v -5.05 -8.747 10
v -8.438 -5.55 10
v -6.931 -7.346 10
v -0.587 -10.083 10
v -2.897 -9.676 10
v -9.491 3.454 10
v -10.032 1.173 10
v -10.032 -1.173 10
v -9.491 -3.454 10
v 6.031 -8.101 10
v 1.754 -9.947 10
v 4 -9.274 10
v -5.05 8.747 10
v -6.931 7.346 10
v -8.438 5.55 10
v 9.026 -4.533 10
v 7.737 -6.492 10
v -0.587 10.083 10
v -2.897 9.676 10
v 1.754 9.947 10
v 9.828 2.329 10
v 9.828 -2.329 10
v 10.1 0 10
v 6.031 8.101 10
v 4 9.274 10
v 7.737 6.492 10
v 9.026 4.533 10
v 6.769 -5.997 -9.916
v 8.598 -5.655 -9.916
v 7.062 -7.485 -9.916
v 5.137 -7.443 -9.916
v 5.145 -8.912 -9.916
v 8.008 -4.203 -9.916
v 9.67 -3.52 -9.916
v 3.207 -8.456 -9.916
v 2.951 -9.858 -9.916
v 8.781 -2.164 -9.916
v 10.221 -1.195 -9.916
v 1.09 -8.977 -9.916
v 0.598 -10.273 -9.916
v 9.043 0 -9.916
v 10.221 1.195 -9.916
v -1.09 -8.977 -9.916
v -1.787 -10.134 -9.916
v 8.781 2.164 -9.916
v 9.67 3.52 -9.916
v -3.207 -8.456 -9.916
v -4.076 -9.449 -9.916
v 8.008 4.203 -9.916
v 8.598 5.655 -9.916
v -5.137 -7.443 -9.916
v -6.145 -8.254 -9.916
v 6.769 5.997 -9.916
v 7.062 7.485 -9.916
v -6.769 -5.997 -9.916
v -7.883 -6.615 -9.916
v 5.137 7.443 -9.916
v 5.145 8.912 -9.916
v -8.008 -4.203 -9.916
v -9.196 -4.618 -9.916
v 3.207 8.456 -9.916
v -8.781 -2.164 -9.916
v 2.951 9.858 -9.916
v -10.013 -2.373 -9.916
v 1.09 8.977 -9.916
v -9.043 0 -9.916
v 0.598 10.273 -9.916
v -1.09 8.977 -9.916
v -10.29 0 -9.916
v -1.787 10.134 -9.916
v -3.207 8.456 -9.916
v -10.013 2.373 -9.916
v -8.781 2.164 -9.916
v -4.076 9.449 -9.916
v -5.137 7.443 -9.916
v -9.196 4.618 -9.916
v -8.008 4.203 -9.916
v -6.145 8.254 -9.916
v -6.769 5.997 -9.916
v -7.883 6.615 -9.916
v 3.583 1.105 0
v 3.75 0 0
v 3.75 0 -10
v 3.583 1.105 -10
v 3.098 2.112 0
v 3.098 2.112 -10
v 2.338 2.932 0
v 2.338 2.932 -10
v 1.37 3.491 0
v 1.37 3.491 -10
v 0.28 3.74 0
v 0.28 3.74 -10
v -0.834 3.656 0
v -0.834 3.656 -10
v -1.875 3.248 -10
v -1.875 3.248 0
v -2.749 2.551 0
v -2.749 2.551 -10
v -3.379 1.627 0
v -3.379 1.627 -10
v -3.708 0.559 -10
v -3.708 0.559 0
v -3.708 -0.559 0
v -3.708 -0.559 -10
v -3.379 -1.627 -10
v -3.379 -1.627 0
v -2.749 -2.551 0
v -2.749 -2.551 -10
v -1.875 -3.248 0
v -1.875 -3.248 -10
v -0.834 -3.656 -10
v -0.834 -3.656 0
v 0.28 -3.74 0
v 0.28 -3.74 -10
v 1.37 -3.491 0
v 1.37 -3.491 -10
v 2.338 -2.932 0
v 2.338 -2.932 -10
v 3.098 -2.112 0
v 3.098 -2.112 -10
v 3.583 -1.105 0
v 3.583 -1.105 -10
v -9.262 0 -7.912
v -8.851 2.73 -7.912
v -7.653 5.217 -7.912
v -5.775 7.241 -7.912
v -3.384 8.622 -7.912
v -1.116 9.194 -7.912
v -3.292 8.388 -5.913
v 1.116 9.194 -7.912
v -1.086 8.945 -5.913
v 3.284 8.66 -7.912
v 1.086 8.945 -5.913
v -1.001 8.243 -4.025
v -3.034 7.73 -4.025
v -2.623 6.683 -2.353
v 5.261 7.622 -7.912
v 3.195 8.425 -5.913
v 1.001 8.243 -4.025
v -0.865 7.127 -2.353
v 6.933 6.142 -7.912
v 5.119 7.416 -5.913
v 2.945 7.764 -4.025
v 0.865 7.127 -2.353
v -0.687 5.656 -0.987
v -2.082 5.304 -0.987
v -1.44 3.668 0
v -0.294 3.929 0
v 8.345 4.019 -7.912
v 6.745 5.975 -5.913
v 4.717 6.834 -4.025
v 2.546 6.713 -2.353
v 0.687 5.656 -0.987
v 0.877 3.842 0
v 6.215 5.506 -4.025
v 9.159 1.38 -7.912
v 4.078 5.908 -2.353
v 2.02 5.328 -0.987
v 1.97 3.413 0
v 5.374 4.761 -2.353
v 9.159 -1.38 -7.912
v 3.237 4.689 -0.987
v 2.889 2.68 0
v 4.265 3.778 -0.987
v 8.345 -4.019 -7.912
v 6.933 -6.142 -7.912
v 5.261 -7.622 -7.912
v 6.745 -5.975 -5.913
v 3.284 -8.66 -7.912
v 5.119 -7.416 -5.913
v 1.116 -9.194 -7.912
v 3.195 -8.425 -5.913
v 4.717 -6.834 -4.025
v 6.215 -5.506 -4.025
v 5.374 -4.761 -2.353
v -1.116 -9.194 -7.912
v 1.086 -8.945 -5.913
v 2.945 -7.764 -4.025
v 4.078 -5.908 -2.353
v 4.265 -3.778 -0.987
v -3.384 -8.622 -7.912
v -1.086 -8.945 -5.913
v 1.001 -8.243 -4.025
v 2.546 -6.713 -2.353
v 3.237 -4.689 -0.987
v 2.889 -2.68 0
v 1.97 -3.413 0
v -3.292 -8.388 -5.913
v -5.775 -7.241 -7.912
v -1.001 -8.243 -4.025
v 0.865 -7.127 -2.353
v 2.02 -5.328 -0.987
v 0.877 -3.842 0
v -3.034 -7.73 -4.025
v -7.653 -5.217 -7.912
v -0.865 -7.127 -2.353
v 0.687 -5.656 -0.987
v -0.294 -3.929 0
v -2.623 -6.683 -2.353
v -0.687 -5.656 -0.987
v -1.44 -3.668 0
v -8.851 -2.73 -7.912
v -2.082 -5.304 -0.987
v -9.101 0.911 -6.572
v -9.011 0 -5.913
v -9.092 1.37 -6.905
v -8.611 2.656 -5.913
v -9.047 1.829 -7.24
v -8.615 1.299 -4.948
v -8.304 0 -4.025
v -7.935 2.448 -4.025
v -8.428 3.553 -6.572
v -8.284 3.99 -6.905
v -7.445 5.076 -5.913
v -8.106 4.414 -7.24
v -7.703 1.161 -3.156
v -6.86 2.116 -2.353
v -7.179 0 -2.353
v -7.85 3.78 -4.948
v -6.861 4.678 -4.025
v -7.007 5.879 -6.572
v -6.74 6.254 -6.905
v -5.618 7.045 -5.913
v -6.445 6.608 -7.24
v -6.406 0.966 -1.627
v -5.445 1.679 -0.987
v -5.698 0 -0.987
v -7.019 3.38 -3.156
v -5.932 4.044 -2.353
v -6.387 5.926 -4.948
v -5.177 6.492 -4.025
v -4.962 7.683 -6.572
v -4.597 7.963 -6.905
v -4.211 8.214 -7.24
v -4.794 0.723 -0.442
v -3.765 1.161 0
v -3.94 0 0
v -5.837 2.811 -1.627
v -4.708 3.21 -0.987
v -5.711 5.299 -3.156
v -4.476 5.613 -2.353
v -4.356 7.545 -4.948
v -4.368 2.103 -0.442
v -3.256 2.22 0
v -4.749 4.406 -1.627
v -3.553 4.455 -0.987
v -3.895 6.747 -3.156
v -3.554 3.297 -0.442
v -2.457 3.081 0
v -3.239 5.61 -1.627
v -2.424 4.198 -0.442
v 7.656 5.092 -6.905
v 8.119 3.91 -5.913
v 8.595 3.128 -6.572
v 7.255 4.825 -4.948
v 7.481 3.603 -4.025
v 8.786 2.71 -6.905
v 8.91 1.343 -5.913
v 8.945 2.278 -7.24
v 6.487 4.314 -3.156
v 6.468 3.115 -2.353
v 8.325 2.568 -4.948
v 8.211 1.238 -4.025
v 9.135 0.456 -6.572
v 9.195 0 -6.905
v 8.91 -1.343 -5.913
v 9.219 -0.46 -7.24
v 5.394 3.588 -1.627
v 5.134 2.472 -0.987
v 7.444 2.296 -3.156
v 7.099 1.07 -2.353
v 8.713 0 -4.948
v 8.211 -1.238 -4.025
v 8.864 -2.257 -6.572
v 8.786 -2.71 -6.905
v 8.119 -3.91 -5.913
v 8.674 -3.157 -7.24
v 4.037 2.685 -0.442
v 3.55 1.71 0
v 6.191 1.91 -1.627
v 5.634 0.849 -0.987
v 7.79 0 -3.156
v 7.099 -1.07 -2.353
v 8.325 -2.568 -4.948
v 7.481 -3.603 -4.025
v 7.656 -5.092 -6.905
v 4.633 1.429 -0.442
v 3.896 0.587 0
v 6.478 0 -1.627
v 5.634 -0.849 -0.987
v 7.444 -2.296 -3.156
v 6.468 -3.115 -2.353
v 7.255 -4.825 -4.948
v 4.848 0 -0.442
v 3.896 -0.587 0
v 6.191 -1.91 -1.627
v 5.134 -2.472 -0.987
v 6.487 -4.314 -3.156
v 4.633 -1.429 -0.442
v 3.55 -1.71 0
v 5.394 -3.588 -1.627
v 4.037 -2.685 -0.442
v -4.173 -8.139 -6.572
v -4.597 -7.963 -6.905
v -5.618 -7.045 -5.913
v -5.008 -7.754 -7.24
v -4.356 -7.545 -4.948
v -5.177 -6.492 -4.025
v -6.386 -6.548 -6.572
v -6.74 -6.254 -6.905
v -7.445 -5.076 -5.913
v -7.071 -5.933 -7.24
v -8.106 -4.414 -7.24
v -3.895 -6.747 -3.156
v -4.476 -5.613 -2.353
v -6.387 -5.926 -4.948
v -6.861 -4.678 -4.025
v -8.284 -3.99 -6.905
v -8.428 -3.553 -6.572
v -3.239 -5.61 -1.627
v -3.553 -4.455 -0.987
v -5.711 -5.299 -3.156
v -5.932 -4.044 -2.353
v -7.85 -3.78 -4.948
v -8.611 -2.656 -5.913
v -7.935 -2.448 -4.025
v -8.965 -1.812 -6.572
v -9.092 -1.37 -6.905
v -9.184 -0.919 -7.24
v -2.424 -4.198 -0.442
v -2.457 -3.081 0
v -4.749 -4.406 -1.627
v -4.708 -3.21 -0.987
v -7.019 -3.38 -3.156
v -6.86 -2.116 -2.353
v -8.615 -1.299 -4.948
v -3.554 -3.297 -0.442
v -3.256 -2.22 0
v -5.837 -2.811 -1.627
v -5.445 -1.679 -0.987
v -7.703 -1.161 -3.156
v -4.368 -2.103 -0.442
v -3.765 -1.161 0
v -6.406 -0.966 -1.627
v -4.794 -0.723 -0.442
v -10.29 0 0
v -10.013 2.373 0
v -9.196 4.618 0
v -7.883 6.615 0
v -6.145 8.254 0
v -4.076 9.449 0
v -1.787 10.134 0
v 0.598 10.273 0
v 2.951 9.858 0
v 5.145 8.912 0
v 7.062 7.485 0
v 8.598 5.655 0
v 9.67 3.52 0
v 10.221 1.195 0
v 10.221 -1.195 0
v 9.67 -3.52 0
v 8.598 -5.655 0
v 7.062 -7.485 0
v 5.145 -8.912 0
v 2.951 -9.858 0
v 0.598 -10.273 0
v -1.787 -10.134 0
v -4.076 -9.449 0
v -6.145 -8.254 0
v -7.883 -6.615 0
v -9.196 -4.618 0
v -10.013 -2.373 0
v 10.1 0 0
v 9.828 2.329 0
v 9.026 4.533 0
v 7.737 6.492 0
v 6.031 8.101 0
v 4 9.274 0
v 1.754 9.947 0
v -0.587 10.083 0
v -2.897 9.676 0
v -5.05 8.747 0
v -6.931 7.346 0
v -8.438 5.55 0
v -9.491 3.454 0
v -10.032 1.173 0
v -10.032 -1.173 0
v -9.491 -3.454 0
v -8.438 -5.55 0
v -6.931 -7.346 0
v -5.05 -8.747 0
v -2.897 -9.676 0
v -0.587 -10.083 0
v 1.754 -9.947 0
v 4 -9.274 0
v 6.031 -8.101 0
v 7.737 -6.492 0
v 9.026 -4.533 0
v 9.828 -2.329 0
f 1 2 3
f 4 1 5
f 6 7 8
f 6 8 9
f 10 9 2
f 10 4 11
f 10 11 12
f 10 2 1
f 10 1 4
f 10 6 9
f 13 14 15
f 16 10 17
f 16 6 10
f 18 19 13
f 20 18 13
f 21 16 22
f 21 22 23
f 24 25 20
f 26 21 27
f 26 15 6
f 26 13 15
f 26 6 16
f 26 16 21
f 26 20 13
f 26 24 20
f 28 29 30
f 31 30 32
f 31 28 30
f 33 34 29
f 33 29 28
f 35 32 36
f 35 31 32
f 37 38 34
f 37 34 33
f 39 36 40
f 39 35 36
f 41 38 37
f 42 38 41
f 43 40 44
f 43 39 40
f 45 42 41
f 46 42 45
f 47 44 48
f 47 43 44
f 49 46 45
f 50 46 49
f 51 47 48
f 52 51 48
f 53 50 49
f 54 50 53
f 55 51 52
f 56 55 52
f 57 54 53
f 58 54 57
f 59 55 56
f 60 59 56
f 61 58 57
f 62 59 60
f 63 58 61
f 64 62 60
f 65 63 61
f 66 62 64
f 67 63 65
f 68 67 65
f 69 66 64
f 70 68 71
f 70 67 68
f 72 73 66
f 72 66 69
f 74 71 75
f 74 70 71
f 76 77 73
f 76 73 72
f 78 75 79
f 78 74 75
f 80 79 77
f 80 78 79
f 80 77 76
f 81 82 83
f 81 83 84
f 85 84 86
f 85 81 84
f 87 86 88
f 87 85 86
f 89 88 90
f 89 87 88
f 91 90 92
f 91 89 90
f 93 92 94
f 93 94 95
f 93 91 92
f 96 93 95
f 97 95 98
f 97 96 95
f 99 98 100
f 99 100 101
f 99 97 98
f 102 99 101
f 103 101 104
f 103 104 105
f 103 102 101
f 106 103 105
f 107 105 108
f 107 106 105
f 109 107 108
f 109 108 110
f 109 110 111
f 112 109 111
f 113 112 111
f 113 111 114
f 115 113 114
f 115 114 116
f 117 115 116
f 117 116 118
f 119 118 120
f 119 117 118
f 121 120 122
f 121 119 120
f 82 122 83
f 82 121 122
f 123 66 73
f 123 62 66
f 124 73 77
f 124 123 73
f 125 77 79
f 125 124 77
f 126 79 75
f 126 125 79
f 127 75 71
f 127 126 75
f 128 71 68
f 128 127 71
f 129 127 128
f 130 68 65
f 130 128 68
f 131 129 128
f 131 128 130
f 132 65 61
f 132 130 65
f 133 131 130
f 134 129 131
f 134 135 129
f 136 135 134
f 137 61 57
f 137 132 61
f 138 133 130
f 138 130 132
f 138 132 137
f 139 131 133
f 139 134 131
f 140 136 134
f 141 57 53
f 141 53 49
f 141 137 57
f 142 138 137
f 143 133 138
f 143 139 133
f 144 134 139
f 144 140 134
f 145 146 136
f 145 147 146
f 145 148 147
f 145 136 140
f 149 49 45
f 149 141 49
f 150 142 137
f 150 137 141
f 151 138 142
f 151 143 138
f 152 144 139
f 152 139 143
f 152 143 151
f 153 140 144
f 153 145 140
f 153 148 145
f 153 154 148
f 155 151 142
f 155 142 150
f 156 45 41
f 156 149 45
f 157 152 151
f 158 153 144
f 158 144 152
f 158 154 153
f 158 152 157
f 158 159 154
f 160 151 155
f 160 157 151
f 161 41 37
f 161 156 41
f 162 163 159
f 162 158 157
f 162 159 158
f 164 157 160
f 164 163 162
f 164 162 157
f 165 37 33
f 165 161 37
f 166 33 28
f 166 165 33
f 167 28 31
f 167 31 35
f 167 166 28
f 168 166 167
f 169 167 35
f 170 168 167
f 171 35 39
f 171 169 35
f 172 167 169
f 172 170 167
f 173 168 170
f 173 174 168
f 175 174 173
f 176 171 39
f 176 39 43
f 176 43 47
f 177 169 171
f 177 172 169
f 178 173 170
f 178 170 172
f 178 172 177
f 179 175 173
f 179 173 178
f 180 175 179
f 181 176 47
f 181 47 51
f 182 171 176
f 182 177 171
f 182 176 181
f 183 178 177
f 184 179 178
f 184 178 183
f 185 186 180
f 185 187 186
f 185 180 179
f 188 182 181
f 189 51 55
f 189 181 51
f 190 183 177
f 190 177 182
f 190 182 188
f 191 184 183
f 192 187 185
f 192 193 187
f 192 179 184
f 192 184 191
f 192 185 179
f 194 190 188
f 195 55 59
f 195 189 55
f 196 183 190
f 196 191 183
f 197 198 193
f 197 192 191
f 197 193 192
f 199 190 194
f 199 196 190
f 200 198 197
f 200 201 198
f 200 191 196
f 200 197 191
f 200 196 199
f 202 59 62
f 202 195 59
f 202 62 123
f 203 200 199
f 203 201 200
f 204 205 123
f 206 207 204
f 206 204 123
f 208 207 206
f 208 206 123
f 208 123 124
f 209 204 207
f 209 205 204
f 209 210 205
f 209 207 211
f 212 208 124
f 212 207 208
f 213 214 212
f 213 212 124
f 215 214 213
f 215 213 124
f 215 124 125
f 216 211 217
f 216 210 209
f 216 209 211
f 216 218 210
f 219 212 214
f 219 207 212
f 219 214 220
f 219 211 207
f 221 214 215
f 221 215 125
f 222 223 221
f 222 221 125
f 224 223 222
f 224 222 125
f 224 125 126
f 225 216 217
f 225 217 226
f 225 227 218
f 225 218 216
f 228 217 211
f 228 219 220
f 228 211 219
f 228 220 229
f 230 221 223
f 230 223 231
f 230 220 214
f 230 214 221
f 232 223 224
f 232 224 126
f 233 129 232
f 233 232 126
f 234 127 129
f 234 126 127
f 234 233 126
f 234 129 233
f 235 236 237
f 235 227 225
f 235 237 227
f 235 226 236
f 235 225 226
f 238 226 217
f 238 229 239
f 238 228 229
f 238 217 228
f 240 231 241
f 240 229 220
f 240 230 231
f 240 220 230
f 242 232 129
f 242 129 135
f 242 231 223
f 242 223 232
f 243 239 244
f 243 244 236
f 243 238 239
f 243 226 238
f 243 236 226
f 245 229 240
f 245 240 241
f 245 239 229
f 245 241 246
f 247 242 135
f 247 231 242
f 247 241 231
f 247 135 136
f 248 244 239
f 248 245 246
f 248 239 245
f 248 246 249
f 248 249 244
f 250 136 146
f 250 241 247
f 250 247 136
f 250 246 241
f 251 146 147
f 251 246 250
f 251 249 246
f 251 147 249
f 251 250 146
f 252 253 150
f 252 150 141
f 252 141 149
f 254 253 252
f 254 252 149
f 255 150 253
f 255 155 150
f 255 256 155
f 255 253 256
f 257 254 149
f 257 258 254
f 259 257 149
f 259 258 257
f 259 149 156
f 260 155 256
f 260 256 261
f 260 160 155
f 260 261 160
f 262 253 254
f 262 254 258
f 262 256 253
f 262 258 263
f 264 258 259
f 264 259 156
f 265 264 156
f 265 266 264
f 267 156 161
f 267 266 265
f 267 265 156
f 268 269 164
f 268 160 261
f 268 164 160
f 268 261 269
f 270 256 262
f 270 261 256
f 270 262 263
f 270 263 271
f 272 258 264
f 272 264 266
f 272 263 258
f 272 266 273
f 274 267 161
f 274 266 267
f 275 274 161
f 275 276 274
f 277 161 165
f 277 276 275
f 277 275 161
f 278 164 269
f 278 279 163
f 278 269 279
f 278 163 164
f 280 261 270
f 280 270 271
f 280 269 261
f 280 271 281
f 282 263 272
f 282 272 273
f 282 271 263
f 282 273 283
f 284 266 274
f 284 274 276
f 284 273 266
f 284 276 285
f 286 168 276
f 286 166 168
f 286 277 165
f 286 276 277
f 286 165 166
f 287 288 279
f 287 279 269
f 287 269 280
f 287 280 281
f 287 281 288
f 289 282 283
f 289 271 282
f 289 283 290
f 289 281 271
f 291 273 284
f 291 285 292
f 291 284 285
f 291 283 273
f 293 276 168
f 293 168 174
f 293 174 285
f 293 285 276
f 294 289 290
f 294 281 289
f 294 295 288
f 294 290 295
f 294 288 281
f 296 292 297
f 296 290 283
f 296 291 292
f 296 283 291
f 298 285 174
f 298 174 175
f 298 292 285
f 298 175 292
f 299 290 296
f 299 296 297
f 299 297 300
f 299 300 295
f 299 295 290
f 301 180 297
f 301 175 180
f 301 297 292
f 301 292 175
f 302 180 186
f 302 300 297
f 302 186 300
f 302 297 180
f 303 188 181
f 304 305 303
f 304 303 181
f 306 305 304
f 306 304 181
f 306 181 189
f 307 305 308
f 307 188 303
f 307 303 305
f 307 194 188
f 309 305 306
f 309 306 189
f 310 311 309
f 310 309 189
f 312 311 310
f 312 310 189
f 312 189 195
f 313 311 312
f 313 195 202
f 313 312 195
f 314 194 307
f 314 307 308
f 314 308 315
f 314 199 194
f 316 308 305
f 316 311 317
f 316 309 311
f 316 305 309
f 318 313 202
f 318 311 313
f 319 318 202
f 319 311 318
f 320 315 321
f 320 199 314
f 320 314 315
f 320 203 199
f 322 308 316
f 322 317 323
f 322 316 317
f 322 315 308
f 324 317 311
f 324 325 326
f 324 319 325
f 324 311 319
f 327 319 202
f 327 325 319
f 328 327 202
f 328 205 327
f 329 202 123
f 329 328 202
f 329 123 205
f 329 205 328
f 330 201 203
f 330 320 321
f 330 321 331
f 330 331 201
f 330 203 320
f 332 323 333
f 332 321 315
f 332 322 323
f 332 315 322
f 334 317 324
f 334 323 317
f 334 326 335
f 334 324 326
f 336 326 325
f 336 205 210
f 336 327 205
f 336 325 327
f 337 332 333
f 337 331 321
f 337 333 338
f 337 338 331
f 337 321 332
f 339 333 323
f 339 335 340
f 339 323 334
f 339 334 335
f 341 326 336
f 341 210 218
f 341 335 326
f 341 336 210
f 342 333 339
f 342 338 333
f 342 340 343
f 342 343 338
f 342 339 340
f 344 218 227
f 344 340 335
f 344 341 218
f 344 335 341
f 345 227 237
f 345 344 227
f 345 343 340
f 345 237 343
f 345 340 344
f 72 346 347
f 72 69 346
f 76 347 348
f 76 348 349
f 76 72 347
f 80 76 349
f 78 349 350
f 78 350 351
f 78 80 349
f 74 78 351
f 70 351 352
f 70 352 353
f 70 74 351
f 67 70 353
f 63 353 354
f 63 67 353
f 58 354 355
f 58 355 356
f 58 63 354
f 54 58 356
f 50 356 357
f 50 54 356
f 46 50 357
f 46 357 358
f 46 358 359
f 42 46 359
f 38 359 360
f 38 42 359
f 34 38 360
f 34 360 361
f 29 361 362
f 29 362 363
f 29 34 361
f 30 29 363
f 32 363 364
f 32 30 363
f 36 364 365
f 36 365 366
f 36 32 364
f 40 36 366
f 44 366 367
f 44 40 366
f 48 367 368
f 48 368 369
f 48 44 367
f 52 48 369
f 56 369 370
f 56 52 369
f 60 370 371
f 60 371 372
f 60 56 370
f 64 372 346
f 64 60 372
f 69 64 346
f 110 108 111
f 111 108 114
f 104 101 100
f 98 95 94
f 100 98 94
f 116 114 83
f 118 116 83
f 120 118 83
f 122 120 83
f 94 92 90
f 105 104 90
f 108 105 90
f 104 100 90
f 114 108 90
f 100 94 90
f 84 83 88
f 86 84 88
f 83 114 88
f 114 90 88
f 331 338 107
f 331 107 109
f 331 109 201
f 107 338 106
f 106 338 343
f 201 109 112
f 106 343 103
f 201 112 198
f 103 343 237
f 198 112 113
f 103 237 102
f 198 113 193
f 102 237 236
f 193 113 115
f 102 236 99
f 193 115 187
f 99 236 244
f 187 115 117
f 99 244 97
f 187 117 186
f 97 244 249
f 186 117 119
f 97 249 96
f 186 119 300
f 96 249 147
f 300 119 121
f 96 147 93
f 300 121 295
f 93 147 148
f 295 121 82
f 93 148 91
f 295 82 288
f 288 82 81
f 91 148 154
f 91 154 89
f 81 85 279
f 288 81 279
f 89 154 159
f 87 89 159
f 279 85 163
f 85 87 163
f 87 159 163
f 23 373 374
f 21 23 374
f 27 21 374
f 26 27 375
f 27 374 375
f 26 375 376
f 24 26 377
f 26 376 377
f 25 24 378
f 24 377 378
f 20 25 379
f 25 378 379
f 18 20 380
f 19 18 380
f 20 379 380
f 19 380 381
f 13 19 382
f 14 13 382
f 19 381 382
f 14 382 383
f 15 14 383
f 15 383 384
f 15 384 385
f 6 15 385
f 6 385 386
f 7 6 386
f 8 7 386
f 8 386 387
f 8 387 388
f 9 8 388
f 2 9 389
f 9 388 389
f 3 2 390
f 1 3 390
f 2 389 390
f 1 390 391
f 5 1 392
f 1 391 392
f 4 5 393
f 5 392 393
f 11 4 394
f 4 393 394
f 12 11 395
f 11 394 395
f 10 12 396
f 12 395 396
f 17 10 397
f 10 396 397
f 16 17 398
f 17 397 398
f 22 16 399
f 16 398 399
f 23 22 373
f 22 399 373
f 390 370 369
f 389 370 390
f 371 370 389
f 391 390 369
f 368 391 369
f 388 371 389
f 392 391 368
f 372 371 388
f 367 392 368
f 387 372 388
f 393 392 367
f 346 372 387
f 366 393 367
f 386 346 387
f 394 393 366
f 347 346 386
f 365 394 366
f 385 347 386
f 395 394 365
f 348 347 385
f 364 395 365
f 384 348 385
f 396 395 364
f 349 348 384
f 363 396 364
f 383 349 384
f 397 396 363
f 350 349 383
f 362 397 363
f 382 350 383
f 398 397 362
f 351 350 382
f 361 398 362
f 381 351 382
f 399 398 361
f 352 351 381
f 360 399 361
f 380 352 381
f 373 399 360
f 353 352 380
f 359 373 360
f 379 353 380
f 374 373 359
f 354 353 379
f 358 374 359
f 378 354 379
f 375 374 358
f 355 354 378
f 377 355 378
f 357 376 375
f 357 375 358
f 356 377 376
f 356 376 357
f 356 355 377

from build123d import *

# Parameters (mm, degrees)
F0_R     = 10.1
F1_DEPTH = 10
F2_R     = 3.75
F3_DEPTH = 10


with BuildPart() as f1:
    # F0 (on Top) → F1 (new body)
    with BuildSketch(Plane.XY):
        Circle(F0_R)
    extrude(amount=F1_DEPTH)

    # F2 (on Top) → F3 (join)
    with BuildSketch(Plane.XY):
        Circle(F2_R)
    extrude(amount=-F3_DEPTH)

    # F4 (on Front) → F5 (revolve)
    with BuildSketch(Plane.XZ):
        with BuildLine():
            Line((-3.9404258132, 0), (-10.2904258132, 0))
            Line((-10.2904258132, 0), (-10.2904258132, -9.9157679855))
            Line((-10.2904258132, -9.9157679855), (-9.0434306607, -9.9157679855))
            ThreePointArc((-9.0434306607, -9.9157679855), (-8.3038120471, -4.0254245121), (-3.9404258132, 0))
        make_face()
    revolve(axis=Axis((0, 0, -4.4246494012), (0, 0, -1)))


solid = f1.part
